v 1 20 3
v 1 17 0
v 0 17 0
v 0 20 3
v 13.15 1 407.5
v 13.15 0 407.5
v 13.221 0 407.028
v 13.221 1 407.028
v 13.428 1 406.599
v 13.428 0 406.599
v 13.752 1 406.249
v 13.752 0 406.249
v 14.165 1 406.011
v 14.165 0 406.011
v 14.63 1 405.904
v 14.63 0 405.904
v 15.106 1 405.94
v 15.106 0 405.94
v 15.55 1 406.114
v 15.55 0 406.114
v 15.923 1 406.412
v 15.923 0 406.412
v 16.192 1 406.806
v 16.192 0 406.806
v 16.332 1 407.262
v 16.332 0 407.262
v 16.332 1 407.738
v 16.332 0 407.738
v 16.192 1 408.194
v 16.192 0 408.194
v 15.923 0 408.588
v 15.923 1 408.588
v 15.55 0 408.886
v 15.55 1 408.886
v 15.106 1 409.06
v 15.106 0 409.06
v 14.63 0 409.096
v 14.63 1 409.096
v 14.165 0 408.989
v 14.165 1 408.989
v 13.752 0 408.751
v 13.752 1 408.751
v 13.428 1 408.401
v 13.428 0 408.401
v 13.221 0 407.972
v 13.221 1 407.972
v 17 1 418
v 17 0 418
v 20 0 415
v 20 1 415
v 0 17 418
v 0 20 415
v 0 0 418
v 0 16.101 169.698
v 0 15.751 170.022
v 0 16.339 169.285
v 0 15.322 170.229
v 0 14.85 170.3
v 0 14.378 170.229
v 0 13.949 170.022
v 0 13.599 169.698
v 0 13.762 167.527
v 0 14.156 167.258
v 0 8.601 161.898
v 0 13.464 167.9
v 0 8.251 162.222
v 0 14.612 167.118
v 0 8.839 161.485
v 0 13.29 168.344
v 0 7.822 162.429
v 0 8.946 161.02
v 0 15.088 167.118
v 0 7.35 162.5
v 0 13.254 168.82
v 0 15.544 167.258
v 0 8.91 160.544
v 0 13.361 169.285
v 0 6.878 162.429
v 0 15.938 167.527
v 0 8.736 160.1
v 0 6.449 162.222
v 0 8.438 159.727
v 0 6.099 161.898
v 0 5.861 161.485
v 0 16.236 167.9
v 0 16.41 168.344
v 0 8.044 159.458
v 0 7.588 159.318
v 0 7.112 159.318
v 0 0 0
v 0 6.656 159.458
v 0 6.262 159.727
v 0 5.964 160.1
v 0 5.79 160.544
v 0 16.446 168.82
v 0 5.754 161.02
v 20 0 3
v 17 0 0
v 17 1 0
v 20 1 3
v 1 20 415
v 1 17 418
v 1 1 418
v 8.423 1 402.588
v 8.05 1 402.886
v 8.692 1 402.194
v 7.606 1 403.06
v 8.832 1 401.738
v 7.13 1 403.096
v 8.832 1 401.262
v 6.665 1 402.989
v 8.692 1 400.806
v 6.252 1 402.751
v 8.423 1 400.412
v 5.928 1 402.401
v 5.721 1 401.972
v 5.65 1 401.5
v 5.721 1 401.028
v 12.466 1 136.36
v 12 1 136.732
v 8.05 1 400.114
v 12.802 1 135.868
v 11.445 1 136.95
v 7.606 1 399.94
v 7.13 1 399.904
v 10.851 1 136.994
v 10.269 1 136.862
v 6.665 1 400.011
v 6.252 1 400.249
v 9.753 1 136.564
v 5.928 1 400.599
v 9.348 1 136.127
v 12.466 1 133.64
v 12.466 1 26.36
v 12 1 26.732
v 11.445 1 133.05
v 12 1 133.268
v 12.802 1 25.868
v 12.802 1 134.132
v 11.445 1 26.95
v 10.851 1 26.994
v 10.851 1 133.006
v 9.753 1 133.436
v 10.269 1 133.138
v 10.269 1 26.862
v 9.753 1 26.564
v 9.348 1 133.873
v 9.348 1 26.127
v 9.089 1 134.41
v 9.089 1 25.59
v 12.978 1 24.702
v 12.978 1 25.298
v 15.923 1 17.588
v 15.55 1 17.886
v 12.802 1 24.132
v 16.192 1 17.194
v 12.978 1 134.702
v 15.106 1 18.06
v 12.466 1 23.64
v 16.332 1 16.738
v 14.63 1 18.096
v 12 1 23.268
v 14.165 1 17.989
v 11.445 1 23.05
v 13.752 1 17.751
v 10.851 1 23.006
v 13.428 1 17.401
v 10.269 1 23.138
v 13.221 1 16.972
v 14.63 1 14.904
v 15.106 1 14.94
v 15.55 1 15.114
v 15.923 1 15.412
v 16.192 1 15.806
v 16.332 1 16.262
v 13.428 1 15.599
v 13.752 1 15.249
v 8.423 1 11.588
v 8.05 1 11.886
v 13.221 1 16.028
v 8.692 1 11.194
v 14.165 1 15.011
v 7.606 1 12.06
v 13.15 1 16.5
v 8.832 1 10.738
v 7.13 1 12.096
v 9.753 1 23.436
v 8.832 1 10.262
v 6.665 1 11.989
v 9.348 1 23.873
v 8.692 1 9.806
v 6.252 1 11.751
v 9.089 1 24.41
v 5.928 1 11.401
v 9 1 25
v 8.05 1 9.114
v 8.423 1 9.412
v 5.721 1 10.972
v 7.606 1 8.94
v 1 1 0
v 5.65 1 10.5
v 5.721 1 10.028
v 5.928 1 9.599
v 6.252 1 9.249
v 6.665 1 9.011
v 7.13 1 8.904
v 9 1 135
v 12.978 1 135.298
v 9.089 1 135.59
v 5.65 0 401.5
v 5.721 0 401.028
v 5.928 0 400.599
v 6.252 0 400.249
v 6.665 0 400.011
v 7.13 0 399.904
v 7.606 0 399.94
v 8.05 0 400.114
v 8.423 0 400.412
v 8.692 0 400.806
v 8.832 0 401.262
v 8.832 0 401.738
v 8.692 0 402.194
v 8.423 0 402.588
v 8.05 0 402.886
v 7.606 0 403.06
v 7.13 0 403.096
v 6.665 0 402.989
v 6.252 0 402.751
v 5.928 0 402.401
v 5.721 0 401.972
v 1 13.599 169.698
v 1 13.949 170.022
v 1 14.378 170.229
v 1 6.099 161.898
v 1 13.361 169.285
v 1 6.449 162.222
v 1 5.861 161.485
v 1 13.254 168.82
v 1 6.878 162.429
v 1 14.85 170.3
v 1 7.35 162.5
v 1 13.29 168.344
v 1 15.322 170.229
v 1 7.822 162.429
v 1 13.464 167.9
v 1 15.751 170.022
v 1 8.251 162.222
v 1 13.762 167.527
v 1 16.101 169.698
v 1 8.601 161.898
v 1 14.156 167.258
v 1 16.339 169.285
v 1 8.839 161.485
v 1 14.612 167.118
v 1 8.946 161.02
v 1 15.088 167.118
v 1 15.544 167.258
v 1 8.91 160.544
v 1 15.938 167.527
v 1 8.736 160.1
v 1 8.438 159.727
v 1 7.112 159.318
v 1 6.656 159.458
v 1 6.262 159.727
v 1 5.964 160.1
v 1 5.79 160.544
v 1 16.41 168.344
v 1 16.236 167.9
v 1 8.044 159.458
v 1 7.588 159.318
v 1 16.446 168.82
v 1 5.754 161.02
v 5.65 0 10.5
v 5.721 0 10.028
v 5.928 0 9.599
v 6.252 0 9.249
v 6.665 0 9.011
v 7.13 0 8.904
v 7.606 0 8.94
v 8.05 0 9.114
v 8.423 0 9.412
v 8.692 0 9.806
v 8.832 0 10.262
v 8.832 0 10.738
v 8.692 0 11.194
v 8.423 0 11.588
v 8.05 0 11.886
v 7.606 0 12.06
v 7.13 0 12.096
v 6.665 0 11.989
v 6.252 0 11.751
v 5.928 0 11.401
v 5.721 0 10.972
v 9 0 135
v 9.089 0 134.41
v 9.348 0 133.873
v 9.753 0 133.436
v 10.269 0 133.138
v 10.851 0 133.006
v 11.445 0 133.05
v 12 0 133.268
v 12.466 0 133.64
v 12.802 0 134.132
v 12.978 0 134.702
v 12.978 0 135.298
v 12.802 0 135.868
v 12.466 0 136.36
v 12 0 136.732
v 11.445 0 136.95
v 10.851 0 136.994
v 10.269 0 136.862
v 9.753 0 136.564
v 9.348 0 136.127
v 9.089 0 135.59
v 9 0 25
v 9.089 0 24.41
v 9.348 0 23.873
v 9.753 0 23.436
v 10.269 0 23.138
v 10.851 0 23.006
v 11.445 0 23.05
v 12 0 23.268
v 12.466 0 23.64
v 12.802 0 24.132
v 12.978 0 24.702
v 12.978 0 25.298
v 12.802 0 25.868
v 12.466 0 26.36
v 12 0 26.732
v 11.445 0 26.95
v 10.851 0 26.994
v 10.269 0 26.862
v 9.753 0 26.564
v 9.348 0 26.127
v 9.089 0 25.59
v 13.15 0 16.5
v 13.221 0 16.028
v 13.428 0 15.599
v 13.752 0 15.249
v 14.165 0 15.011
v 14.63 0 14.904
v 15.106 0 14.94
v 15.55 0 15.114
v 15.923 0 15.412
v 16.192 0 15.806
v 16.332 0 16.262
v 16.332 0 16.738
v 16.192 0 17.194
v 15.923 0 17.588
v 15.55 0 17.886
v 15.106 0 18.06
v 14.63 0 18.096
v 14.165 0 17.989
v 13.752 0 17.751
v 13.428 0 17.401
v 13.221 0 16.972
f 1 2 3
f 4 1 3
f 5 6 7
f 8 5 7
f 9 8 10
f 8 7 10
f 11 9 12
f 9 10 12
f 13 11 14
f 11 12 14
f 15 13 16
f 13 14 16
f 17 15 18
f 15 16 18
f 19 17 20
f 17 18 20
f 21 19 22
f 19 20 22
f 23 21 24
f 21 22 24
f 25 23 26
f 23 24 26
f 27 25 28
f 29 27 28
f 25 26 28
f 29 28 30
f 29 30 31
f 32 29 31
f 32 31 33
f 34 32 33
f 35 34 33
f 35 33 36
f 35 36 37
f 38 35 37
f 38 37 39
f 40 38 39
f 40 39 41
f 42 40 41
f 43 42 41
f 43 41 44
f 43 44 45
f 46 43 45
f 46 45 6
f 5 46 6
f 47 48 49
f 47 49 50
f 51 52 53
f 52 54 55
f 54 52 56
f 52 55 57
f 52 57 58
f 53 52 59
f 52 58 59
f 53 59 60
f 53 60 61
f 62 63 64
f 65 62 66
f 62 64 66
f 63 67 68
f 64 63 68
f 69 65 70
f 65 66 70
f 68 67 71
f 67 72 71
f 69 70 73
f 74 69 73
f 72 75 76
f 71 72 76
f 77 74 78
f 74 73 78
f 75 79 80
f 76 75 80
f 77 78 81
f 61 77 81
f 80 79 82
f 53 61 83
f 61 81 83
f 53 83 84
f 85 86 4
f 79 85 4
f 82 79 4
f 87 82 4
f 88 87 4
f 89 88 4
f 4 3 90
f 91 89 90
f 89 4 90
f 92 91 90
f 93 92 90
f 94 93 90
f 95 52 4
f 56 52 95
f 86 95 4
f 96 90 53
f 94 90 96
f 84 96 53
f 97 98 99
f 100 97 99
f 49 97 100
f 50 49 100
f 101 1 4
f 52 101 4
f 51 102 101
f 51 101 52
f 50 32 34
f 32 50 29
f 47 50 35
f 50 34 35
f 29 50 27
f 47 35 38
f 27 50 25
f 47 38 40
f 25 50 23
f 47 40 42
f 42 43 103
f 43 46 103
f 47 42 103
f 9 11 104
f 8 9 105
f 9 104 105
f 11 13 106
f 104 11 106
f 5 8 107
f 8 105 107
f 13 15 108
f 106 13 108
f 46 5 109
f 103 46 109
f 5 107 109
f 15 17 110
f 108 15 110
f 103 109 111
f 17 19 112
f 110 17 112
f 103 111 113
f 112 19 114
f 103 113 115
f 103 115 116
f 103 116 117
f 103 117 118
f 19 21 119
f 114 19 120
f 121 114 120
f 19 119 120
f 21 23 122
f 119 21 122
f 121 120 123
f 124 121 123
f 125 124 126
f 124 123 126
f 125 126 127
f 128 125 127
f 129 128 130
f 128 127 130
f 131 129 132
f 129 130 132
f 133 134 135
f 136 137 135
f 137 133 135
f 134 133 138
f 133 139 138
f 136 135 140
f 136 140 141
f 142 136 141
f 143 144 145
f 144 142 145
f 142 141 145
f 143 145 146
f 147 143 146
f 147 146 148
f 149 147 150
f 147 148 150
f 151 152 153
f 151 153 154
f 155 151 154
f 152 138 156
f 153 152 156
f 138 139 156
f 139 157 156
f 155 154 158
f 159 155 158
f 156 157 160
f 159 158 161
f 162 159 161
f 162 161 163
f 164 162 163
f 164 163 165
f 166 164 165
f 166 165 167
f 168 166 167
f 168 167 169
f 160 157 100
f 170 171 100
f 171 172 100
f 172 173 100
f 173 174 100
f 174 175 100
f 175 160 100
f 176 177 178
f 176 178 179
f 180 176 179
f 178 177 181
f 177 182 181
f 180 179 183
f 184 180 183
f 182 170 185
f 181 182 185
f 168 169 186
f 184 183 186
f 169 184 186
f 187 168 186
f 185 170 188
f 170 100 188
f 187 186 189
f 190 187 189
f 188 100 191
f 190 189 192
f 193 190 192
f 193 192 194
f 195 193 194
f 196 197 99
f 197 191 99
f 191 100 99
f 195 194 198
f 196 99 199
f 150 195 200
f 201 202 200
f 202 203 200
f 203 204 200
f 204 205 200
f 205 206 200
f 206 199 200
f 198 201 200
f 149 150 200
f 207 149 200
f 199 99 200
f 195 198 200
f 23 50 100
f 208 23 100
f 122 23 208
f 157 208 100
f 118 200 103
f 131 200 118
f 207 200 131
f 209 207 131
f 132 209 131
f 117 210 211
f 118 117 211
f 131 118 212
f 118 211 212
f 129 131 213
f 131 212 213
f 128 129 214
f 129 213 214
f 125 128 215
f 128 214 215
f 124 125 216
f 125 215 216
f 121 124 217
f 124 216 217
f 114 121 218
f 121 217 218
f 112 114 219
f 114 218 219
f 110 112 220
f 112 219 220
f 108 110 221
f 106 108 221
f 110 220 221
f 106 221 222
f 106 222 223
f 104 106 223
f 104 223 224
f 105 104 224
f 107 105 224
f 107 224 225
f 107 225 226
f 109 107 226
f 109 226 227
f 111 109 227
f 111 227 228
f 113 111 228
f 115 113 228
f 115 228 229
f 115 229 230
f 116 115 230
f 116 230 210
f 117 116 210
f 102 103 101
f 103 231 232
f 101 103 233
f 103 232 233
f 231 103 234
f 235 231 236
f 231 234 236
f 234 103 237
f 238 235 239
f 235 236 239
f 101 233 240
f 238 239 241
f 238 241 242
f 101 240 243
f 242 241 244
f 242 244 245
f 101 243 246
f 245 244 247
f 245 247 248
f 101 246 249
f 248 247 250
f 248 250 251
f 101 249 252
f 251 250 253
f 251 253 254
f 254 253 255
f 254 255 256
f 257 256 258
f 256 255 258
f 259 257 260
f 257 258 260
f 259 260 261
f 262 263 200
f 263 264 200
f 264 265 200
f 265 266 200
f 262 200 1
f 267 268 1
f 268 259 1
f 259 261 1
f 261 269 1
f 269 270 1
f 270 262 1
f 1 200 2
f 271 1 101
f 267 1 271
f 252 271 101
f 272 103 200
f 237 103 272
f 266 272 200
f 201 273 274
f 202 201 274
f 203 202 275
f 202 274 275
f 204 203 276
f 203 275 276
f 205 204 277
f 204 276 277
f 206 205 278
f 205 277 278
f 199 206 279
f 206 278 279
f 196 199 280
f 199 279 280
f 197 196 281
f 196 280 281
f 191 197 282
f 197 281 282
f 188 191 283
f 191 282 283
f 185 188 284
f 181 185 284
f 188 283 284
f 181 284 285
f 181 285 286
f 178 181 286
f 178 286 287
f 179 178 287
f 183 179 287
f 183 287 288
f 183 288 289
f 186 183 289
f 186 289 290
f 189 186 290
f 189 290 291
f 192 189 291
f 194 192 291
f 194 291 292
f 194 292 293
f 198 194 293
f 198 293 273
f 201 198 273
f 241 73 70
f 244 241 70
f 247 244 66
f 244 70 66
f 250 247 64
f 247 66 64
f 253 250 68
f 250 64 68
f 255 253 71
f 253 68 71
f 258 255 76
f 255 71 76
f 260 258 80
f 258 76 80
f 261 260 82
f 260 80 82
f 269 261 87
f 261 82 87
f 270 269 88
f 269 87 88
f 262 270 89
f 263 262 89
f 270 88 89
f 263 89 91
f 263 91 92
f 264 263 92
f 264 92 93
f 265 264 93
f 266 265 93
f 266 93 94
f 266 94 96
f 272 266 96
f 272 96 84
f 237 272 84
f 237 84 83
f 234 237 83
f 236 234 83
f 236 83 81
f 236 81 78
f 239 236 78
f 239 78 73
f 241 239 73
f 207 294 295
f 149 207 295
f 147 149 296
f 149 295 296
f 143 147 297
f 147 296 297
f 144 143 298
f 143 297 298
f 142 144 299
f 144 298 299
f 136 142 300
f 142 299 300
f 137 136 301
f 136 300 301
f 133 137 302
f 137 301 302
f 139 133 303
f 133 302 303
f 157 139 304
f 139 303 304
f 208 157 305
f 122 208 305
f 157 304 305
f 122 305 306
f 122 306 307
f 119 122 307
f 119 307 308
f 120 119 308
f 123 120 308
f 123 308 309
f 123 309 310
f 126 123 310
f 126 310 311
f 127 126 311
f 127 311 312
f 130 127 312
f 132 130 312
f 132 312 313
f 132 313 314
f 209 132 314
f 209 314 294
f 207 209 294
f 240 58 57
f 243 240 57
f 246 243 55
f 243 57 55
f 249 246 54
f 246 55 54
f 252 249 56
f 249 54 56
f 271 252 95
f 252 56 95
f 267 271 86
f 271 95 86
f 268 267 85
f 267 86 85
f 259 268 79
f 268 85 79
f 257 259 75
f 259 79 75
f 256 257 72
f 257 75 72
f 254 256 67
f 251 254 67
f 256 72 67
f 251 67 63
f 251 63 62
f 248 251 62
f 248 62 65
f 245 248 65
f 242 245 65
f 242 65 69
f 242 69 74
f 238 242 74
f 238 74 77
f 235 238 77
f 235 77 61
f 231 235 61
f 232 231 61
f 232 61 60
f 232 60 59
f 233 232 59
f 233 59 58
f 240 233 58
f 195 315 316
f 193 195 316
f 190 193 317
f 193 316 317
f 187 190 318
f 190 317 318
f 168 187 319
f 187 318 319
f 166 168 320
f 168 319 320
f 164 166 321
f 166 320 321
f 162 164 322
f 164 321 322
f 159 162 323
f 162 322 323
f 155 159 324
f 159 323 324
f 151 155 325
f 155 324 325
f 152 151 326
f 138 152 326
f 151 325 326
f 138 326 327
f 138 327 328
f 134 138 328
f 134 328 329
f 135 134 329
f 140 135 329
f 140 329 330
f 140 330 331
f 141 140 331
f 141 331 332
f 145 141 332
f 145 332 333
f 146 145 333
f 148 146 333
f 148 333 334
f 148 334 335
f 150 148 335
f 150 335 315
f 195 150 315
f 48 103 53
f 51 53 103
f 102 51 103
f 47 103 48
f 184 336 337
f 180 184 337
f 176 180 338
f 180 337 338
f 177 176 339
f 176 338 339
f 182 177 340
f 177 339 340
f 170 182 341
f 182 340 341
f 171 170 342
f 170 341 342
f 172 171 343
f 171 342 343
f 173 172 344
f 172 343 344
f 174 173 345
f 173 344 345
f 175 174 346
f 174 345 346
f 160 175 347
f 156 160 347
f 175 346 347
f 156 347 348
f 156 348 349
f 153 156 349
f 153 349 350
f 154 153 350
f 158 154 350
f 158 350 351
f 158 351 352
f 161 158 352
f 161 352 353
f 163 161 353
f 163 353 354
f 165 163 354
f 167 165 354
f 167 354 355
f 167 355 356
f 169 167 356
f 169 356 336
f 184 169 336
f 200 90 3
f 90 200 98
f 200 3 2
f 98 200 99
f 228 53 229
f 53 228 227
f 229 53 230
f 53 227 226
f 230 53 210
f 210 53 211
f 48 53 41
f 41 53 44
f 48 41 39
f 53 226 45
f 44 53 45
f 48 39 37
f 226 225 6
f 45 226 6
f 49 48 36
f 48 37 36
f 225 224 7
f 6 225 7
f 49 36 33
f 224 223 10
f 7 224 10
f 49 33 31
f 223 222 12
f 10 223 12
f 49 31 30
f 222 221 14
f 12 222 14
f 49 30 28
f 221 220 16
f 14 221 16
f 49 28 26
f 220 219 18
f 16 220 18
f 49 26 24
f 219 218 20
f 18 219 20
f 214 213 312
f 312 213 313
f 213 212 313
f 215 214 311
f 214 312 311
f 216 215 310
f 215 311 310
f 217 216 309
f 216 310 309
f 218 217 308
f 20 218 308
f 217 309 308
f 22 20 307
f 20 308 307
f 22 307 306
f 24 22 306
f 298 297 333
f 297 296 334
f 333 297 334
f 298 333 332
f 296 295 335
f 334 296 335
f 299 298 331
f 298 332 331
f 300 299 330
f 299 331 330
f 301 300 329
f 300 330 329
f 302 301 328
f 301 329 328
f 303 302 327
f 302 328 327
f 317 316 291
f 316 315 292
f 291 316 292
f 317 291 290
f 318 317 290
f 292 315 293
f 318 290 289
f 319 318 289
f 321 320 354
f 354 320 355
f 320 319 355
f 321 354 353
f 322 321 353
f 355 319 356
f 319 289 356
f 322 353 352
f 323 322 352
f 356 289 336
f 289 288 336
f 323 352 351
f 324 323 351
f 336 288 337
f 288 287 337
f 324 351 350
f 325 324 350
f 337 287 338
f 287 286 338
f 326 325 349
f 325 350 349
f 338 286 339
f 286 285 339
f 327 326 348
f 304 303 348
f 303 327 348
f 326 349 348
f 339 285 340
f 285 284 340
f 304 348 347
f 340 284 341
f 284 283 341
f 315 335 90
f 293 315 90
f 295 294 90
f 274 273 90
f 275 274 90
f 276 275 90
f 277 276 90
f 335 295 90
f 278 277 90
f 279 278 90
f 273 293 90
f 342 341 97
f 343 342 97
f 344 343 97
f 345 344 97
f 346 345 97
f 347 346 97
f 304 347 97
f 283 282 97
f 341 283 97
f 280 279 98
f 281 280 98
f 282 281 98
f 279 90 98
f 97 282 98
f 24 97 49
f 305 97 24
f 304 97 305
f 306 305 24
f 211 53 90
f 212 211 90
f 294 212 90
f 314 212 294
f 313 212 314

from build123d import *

# Parameters (mm, degrees)
BASE_DEPTH                      = 418
CHAMFER1_SIZE                   = 3
F_3_2_3_2_CABLE_CARRIER_HOLES_D = 3.2
F_3_2_3_2_DIAMETER_HOLE2_D      = 3.2
F_4_0_4_CABLE_TIE_HOLES_D       = 4


with BuildPart() as part:
    # Sketch1 → Base (new body)
    with BuildSketch(Plane.XY):
        Polygon((0, 0), (20, 0), (20, 1), (1, 1), (1, 20), (0, 20), align=None)
    extrude(amount=BASE_DEPTH)

    # Chamfer1
    chamfer1_edges = [part.edges().sort_by_distance(p)[0] for p in [
        (20, 0.5, 418),
        (0.5, 20, 418),
        (0.5, 20, 0),
        (20, 0.5, 0),
    ]]
    chamfer(chamfer1_edges, length=CHAMFER1_SIZE)

    # Ø3.2 (3.2) Cable Carrier Holes (through all)
    with Locations(Plane(origin=(1, 0, 0), x_dir=(0, 0, -1), z_dir=(1, 0, 0))):
        with Locations((-168.7, 14.85), (-160.9, 7.35)):
            Hole(F_3_2_3_2_CABLE_CARRIER_HOLES_D / 2)

    # Ø3.2 (3.2) Diameter Hole2 (through all)
    with Locations(Plane(origin=(0, 1, 0), x_dir=(1, 0, 0), z_dir=(0, 1, 0))):
        with Locations((7.25, -401.5), (14.75, -407.5), (7.25, -10.5), (14.75, -16.5)):
            Hole(F_3_2_3_2_DIAMETER_HOLE2_D / 2)

    # Ø4.0 (4) Cable Tie Holes (through all)
    with Locations(Plane(origin=(0, 1, 0), x_dir=(1, 0, 0), z_dir=(0, 1, 0))):
        with Locations((11, -25), (11, -135)):
            Hole(F_4_0_4_CABLE_TIE_HOLES_D / 2)


solid = part.part
